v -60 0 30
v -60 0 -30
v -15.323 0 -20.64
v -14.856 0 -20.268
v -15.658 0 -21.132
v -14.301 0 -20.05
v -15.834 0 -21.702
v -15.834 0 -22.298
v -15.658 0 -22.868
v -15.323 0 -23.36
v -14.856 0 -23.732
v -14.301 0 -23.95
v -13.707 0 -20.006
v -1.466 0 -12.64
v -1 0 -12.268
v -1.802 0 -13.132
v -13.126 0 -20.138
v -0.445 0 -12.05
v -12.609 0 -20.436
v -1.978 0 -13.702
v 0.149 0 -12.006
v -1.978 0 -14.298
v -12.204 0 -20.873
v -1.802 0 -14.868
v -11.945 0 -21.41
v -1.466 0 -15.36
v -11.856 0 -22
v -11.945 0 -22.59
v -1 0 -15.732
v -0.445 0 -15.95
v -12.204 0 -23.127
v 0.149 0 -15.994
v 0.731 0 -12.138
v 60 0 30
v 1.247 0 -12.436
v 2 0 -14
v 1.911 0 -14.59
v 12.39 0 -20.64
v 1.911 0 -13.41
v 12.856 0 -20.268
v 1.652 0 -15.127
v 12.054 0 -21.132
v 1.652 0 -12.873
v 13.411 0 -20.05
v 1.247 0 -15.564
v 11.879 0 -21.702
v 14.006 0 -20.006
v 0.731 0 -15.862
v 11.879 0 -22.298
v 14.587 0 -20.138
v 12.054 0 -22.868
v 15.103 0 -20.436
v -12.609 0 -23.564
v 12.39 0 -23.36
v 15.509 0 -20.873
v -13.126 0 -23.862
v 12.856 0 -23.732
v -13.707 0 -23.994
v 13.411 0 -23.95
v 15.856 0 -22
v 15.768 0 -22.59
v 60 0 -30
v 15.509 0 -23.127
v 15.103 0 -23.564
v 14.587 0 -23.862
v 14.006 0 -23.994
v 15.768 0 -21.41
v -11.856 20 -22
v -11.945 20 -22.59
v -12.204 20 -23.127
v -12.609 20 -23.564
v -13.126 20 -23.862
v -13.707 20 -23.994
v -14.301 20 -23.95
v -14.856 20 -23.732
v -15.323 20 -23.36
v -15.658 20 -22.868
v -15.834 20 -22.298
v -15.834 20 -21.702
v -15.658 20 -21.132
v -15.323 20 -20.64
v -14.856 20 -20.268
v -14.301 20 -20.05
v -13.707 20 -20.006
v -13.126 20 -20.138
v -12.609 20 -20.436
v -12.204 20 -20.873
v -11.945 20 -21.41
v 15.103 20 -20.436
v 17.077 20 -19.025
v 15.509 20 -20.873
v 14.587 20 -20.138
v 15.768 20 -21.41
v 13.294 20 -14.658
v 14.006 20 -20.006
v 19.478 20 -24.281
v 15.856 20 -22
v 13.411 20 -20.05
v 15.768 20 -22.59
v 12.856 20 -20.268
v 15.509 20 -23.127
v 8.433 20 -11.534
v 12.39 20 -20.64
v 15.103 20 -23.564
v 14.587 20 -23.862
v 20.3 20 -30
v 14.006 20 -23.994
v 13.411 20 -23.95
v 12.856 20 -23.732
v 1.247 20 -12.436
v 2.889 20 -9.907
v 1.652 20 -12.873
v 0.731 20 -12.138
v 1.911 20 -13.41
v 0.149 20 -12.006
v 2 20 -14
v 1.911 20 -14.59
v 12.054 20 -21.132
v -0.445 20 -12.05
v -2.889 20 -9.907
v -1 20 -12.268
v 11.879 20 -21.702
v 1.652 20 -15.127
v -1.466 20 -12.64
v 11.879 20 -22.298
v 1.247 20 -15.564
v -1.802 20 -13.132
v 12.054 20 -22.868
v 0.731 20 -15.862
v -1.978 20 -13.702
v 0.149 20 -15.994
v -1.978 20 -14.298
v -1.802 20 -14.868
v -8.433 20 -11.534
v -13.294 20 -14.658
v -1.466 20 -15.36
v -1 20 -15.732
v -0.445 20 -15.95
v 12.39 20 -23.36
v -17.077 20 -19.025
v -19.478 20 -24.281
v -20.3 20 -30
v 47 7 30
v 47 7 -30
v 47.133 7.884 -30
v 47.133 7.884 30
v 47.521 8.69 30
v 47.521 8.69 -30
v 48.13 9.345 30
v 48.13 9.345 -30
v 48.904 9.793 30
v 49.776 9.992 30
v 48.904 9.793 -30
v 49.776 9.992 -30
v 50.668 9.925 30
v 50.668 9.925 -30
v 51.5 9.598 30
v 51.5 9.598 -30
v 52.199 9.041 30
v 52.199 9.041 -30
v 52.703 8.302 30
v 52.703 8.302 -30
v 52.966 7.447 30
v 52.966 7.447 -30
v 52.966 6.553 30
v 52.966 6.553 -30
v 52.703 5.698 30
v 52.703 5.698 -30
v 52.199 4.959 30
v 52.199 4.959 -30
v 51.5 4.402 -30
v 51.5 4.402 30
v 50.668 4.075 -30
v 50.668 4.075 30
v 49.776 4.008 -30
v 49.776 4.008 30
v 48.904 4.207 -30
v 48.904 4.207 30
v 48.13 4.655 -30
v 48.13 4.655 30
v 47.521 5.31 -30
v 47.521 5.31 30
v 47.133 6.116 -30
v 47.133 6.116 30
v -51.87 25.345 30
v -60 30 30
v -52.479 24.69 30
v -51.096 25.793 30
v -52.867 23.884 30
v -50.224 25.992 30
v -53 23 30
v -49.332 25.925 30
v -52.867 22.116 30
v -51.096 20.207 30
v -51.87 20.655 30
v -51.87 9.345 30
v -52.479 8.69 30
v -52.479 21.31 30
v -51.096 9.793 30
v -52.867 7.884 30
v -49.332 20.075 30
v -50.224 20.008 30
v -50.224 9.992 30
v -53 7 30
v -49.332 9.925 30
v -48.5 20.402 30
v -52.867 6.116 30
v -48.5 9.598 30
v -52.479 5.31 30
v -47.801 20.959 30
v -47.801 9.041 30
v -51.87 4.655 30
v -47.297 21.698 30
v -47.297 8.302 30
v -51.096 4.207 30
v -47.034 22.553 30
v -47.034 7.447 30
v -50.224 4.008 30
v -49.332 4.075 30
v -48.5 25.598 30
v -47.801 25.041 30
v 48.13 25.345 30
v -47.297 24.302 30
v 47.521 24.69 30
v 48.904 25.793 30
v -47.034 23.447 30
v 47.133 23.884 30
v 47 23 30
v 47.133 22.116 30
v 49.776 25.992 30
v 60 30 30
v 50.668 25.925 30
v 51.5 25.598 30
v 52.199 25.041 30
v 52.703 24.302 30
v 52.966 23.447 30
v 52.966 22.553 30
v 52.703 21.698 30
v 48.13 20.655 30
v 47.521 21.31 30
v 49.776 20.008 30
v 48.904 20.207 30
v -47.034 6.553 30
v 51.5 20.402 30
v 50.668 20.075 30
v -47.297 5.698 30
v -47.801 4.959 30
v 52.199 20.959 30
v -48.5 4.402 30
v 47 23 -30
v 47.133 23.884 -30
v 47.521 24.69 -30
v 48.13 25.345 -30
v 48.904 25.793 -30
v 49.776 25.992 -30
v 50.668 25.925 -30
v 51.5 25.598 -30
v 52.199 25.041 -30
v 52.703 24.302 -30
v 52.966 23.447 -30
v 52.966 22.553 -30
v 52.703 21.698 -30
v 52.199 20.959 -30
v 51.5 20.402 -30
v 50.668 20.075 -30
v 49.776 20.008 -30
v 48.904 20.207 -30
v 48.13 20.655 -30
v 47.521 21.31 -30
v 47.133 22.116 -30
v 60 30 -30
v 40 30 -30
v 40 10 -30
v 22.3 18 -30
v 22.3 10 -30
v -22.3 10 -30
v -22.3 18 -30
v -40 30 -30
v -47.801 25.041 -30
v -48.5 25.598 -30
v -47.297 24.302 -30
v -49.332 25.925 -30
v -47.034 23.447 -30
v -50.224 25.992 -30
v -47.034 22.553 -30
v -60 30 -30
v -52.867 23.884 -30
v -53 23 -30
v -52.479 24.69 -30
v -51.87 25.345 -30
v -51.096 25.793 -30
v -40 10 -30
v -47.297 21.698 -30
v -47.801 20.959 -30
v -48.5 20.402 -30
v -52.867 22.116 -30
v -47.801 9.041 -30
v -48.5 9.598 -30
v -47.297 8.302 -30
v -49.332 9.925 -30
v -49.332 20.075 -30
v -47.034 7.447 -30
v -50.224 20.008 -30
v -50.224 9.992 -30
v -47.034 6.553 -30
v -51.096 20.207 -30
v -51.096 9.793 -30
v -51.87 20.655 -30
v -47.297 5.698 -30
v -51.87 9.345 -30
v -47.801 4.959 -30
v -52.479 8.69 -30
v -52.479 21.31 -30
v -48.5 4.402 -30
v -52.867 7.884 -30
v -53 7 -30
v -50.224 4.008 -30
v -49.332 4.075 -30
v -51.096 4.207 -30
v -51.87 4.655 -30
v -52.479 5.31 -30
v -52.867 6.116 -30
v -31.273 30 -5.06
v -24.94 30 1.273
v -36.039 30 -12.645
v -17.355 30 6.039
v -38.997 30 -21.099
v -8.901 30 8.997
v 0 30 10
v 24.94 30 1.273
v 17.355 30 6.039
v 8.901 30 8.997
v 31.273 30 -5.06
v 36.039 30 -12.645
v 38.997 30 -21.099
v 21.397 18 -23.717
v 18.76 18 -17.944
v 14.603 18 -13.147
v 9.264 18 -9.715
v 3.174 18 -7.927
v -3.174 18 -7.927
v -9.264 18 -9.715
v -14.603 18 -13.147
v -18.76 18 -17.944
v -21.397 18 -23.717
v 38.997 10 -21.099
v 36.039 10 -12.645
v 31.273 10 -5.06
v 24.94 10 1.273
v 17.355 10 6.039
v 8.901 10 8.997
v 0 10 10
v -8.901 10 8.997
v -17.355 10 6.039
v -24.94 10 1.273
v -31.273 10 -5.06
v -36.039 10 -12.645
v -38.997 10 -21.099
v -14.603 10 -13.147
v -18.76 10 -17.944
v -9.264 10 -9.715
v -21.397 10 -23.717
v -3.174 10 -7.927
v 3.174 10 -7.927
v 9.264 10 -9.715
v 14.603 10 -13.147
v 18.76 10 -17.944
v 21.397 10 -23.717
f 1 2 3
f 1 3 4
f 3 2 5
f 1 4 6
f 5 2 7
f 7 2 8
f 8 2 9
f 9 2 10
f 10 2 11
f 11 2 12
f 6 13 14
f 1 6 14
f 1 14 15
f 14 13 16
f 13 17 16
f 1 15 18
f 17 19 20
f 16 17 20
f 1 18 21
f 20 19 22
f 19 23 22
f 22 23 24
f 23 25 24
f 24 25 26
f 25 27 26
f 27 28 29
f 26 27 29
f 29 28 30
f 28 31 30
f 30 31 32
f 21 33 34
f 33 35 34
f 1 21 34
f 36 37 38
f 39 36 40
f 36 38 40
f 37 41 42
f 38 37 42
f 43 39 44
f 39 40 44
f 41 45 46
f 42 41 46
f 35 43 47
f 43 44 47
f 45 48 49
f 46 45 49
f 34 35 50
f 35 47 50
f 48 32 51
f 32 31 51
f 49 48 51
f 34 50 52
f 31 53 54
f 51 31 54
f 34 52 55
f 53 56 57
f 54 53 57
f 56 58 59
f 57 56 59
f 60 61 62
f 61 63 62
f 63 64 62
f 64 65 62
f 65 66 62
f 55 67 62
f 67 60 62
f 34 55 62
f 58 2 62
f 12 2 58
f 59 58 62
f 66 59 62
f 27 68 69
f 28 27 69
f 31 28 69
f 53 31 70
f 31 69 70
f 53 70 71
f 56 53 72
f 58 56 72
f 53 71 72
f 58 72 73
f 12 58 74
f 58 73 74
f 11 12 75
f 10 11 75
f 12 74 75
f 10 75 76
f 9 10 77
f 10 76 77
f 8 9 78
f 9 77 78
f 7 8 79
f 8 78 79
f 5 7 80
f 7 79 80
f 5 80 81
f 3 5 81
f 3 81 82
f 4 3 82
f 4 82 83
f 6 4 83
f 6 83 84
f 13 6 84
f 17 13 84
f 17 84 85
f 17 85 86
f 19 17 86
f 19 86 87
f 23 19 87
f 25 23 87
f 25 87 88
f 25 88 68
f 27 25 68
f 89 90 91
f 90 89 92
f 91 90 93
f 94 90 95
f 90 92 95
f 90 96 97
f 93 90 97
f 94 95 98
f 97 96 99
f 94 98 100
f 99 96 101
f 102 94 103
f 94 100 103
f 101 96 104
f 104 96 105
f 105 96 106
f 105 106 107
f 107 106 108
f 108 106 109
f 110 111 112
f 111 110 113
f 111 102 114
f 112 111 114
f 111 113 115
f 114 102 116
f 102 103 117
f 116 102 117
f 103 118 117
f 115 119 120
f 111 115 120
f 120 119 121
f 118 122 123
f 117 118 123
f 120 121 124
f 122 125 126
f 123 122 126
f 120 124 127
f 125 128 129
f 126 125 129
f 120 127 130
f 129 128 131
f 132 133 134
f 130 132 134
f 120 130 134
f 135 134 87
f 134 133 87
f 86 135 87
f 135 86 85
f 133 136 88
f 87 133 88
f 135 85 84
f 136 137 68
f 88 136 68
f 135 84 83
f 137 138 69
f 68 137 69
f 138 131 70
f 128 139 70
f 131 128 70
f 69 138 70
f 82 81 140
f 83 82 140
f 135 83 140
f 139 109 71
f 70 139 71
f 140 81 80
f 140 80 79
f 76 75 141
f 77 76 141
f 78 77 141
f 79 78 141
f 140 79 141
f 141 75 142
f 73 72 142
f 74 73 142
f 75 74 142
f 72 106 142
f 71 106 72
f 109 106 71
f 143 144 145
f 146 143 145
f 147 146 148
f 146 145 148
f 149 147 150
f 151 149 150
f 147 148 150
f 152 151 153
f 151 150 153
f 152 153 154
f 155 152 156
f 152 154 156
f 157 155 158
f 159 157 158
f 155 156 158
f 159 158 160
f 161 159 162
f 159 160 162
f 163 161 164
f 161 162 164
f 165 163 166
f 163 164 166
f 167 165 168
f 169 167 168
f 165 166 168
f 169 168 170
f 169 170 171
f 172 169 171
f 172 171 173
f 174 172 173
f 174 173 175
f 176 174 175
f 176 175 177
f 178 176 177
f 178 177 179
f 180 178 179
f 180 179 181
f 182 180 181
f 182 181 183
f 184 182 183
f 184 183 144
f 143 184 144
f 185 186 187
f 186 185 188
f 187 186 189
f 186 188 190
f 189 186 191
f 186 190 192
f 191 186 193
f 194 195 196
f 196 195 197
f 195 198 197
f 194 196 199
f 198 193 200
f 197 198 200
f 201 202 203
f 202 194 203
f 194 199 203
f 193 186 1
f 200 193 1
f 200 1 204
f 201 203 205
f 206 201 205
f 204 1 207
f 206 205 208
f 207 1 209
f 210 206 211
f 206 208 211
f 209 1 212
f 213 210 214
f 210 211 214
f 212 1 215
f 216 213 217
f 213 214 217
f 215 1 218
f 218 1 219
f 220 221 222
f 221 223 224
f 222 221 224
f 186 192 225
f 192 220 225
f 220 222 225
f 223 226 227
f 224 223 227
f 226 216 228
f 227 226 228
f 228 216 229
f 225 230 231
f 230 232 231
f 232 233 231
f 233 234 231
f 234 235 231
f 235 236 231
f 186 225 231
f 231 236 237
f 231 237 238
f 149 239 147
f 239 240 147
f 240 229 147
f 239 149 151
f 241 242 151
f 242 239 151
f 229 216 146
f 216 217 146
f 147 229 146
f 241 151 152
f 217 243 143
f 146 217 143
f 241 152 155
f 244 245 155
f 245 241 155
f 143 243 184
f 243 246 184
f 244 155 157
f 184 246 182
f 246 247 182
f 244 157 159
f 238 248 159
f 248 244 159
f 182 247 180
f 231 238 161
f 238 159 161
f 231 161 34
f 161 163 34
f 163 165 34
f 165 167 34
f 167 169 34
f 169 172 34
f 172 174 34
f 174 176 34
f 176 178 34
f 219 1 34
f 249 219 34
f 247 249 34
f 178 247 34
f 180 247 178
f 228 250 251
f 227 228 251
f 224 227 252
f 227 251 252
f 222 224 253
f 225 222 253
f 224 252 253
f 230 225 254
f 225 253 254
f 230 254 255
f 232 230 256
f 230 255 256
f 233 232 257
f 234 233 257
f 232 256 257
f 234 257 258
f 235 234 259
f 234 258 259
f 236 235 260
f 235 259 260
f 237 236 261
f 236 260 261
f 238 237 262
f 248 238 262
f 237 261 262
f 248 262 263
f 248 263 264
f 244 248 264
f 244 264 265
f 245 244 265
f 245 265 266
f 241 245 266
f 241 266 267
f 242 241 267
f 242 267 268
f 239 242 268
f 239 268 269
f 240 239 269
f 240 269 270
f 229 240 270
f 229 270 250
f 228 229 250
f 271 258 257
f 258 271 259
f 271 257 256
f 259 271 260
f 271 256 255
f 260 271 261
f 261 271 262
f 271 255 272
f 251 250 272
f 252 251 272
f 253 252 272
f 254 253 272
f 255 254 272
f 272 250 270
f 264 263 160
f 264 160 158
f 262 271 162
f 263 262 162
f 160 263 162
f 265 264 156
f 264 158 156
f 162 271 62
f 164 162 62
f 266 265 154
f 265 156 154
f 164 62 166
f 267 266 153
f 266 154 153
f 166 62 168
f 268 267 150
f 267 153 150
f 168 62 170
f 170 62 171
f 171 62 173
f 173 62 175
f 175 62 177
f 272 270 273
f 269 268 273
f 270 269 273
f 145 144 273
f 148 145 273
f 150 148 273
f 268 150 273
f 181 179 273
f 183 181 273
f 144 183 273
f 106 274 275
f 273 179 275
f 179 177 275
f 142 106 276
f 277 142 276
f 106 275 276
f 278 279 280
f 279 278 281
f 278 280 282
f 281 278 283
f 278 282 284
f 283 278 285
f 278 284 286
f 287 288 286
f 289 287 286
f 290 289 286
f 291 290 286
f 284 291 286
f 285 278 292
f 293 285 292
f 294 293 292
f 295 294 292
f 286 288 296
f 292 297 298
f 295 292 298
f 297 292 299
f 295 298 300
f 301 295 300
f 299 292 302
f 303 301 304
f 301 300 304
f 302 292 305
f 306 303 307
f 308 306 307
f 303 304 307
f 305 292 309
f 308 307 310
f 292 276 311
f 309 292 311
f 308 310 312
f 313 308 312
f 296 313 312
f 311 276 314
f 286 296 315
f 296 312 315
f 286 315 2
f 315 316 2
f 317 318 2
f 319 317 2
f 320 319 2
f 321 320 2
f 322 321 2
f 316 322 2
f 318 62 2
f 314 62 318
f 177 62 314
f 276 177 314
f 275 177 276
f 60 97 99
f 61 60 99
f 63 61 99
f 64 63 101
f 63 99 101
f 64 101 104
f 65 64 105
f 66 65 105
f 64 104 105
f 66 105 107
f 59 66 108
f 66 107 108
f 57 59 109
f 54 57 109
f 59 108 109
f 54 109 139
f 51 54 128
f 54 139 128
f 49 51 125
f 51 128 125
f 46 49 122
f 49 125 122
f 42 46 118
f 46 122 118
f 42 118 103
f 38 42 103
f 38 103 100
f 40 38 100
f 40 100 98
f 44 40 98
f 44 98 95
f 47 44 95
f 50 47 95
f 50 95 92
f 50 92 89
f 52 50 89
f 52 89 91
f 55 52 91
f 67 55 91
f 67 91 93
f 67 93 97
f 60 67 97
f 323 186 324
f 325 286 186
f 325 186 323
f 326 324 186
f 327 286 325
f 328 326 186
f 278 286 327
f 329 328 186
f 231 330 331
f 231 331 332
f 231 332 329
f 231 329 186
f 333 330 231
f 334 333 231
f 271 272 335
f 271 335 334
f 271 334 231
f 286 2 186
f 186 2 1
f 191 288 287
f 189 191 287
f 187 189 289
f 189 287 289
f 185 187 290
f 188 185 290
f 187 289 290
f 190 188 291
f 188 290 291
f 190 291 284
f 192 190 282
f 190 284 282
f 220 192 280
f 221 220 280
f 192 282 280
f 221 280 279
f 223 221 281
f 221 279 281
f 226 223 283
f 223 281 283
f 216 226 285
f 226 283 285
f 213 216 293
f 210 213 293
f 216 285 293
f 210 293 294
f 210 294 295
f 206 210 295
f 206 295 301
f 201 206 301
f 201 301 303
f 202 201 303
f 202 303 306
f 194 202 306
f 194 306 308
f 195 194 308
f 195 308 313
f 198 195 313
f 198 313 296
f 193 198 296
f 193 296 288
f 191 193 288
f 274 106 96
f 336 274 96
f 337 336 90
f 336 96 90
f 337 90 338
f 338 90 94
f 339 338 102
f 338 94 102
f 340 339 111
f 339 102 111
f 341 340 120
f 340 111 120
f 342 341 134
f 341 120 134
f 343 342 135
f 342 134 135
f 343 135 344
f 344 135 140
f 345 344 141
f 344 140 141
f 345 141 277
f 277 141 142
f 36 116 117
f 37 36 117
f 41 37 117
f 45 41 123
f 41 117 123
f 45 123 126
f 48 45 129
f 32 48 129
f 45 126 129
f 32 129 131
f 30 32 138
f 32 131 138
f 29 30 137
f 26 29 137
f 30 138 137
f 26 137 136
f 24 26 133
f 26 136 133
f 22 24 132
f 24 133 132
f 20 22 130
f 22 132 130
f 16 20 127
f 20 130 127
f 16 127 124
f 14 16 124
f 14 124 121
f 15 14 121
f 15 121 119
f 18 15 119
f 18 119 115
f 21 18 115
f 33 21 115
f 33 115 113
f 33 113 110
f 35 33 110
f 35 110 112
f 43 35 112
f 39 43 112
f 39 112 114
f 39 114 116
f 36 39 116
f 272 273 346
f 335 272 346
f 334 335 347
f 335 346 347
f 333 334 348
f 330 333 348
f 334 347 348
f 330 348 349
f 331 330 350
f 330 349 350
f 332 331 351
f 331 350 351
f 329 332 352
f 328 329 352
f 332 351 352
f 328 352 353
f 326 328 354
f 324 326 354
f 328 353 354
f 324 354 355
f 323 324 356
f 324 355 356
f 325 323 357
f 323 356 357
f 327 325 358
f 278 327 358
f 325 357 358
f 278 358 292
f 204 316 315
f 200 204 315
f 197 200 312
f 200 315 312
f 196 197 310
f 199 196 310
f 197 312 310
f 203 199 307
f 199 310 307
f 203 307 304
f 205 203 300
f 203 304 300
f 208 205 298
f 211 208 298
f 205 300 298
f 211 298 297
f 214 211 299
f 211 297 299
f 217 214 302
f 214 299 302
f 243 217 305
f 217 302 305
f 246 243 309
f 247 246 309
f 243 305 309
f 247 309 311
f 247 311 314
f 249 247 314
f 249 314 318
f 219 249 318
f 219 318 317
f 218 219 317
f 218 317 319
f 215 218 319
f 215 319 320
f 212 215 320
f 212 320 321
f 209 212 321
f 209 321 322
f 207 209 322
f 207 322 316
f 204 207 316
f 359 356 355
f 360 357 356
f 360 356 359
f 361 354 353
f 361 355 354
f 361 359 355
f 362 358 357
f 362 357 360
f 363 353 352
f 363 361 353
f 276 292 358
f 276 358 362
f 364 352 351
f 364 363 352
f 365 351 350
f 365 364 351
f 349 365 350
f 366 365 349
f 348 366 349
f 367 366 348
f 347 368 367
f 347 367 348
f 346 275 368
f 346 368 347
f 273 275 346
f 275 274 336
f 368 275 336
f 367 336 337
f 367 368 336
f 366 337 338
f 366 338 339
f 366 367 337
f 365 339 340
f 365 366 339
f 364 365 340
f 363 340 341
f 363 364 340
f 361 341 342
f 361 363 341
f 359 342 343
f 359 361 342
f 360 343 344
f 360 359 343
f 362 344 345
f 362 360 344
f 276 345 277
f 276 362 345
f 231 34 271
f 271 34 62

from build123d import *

# Parameters (mm, degrees)
ESQUISSE1_W             = 120
ESQUISSE1_H             = 60
BOSS_EXTRU_1_DEPTH      = 10
BOSS_EXTRU_2_DEPTH      = 20
BOSS_EXTRU_3_DEPTH      = 10
CHANFREIN1_SIZE         = 2
ENL_V_MAT_EXTRU_1_REACH = 62
ESQUISSE4_R             = 3
ENL_V_MAT_EXTRU_2_REACH = 22
ESQUISSE5_R             = 2


with BuildPart() as part:
    # Esquisse1 → Boss.-Extru.1 (new body)
    with BuildSketch(Plane(origin=(0, 0, 0), x_dir=(1, 0, 0), z_dir=(0, 1, 0))):
        Rectangle(ESQUISSE1_W, ESQUISSE1_H)
    extrude(amount=BOSS_EXTRU_1_DEPTH)

    # Esquisse2 → Boss.-Extru.2 (add)
    with BuildSketch(Plane(origin=(0, 10, 0), x_dir=(1, 0, 0), z_dir=(0, 1, 0))):
        with BuildLine():
            Line((-40, 30), (-60, 30))
            Line((-60, 30), (-60, -30))
            Line((-60, -30), (60, -30))
            Line((60, -30), (60, 30))
            Line((60, 30), (40, 30))
            ThreePointArc((40, 30), (0, -10), (-40, 30))
        make_face()
    extrude(amount=BOSS_EXTRU_2_DEPTH)

    # Esquisse3 → Boss.-Extru.3 (add)
    with BuildSketch(Plane(origin=(0, 10, 0), x_dir=(1, 0, 0), z_dir=(0, 1, 0))):
        with BuildLine():
            Line((-22.3, 30), (22.3, 30))
            ThreePointArc((22.3, 30), (0, 7.7), (-22.3, 30))
        make_face()
    extrude(amount=BOSS_EXTRU_3_DEPTH)

    # Chanfrein1
    chanfrein1_edges = [part.edges().sort_by_distance(p)[0] for p in [
        (0, 20, -7.7),
    ]]
    chamfer(chanfrein1_edges, length=CHANFREIN1_SIZE)

    # Esquisse4 → Enlèv. mat.-Extru.1 (cut, up to next)
    with BuildSketch(Plane(origin=(0, 0, -30), x_dir=(-1, 0, 0), z_dir=(0, 0, -1)), mode=Mode.PRIVATE) as enl_v_mat_extru_1_sk1:
        with Locations((-50, 23)):
            Circle(ESQUISSE4_R)
    enl_v_mat_extru_1_tool1 = extrude(enl_v_mat_extru_1_sk1.sketch, amount=-ENL_V_MAT_EXTRU_1_REACH, mode=Mode.PRIVATE) & part.part
    add(enl_v_mat_extru_1_tool1.solids().sort_by_distance((50, 23, -30))[0], mode=Mode.SUBTRACT)
    # Esquisse4 → Enlèv. mat.-Extru.1 (cut, up to next)
    with BuildSketch(Plane(origin=(0, 0, -30), x_dir=(-1, 0, 0), z_dir=(0, 0, -1)), mode=Mode.PRIVATE) as enl_v_mat_extru_1_sk2:
        with Locations((50, 23)):
            Circle(ESQUISSE4_R)
    enl_v_mat_extru_1_tool2 = extrude(enl_v_mat_extru_1_sk2.sketch, amount=-ENL_V_MAT_EXTRU_1_REACH, mode=Mode.PRIVATE) & part.part
    add(enl_v_mat_extru_1_tool2.solids().sort_by_distance((-50, 23, -30))[0], mode=Mode.SUBTRACT)
    # Esquisse4 → Enlèv. mat.-Extru.1 (cut, up to next)
    with BuildSketch(Plane(origin=(0, 0, -30), x_dir=(-1, 0, 0), z_dir=(0, 0, -1)), mode=Mode.PRIVATE) as enl_v_mat_extru_1_sk3:
        with Locations((-50, 7)):
            Circle(ESQUISSE4_R)
    enl_v_mat_extru_1_tool3 = extrude(enl_v_mat_extru_1_sk3.sketch, amount=-ENL_V_MAT_EXTRU_1_REACH, mode=Mode.PRIVATE) & part.part
    add(enl_v_mat_extru_1_tool3.solids().sort_by_distance((50, 7, -30))[0], mode=Mode.SUBTRACT)
    # Esquisse4 → Enlèv. mat.-Extru.1 (cut, up to next)
    with BuildSketch(Plane(origin=(0, 0, -30), x_dir=(-1, 0, 0), z_dir=(0, 0, -1)), mode=Mode.PRIVATE) as enl_v_mat_extru_1_sk4:
        with Locations((50, 7)):
            Circle(ESQUISSE4_R)
    enl_v_mat_extru_1_tool4 = extrude(enl_v_mat_extru_1_sk4.sketch, amount=-ENL_V_MAT_EXTRU_1_REACH, mode=Mode.PRIVATE) & part.part
    add(enl_v_mat_extru_1_tool4.solids().sort_by_distance((-50, 7, -30))[0], mode=Mode.SUBTRACT)

    # Esquisse5 → Enlèv. mat.-Extru.2 (cut, up to next)
    with BuildSketch(Plane(origin=(0, 20, 0), x_dir=(1, 0, 0), z_dir=(0, 1, 0)), mode=Mode.PRIVATE) as enl_v_mat_extru_2_sk1:
        with Locations((0, 14)):
            Circle(ESQUISSE5_R)
    enl_v_mat_extru_2_tool1 = extrude(enl_v_mat_extru_2_sk1.sketch, amount=-ENL_V_MAT_EXTRU_2_REACH, mode=Mode.PRIVATE) & part.part
    add(enl_v_mat_extru_2_tool1.solids().sort_by_distance((0, 20, -14))[0], mode=Mode.SUBTRACT)
    # Esquisse5 → Enlèv. mat.-Extru.2 (cut, up to next)
    with BuildSketch(Plane(origin=(0, 20, 0), x_dir=(1, 0, 0), z_dir=(0, 1, 0)), mode=Mode.PRIVATE) as enl_v_mat_extru_2_sk2:
        with Locations((-13.856406461, 22)):
            Circle(ESQUISSE5_R)
    enl_v_mat_extru_2_tool2 = extrude(enl_v_mat_extru_2_sk2.sketch, amount=-ENL_V_MAT_EXTRU_2_REACH, mode=Mode.PRIVATE) & part.part
    add(enl_v_mat_extru_2_tool2.solids().sort_by_distance((-13.856406, 20, -22))[0], mode=Mode.SUBTRACT)
    # Esquisse5 → Enlèv. mat.-Extru.2 (cut, up to next)
    with BuildSketch(Plane(origin=(0, 20, 0), x_dir=(1, 0, 0), z_dir=(0, 1, 0)), mode=Mode.PRIVATE) as enl_v_mat_extru_2_sk3:
        with Locations((13.856406461, 22)):
            Circle(ESQUISSE5_R)
    enl_v_mat_extru_2_tool3 = extrude(enl_v_mat_extru_2_sk3.sketch, amount=-ENL_V_MAT_EXTRU_2_REACH, mode=Mode.PRIVATE) & part.part
    add(enl_v_mat_extru_2_tool3.solids().sort_by_distance((13.856406, 20, -22))[0], mode=Mode.SUBTRACT)


solid = part.part
